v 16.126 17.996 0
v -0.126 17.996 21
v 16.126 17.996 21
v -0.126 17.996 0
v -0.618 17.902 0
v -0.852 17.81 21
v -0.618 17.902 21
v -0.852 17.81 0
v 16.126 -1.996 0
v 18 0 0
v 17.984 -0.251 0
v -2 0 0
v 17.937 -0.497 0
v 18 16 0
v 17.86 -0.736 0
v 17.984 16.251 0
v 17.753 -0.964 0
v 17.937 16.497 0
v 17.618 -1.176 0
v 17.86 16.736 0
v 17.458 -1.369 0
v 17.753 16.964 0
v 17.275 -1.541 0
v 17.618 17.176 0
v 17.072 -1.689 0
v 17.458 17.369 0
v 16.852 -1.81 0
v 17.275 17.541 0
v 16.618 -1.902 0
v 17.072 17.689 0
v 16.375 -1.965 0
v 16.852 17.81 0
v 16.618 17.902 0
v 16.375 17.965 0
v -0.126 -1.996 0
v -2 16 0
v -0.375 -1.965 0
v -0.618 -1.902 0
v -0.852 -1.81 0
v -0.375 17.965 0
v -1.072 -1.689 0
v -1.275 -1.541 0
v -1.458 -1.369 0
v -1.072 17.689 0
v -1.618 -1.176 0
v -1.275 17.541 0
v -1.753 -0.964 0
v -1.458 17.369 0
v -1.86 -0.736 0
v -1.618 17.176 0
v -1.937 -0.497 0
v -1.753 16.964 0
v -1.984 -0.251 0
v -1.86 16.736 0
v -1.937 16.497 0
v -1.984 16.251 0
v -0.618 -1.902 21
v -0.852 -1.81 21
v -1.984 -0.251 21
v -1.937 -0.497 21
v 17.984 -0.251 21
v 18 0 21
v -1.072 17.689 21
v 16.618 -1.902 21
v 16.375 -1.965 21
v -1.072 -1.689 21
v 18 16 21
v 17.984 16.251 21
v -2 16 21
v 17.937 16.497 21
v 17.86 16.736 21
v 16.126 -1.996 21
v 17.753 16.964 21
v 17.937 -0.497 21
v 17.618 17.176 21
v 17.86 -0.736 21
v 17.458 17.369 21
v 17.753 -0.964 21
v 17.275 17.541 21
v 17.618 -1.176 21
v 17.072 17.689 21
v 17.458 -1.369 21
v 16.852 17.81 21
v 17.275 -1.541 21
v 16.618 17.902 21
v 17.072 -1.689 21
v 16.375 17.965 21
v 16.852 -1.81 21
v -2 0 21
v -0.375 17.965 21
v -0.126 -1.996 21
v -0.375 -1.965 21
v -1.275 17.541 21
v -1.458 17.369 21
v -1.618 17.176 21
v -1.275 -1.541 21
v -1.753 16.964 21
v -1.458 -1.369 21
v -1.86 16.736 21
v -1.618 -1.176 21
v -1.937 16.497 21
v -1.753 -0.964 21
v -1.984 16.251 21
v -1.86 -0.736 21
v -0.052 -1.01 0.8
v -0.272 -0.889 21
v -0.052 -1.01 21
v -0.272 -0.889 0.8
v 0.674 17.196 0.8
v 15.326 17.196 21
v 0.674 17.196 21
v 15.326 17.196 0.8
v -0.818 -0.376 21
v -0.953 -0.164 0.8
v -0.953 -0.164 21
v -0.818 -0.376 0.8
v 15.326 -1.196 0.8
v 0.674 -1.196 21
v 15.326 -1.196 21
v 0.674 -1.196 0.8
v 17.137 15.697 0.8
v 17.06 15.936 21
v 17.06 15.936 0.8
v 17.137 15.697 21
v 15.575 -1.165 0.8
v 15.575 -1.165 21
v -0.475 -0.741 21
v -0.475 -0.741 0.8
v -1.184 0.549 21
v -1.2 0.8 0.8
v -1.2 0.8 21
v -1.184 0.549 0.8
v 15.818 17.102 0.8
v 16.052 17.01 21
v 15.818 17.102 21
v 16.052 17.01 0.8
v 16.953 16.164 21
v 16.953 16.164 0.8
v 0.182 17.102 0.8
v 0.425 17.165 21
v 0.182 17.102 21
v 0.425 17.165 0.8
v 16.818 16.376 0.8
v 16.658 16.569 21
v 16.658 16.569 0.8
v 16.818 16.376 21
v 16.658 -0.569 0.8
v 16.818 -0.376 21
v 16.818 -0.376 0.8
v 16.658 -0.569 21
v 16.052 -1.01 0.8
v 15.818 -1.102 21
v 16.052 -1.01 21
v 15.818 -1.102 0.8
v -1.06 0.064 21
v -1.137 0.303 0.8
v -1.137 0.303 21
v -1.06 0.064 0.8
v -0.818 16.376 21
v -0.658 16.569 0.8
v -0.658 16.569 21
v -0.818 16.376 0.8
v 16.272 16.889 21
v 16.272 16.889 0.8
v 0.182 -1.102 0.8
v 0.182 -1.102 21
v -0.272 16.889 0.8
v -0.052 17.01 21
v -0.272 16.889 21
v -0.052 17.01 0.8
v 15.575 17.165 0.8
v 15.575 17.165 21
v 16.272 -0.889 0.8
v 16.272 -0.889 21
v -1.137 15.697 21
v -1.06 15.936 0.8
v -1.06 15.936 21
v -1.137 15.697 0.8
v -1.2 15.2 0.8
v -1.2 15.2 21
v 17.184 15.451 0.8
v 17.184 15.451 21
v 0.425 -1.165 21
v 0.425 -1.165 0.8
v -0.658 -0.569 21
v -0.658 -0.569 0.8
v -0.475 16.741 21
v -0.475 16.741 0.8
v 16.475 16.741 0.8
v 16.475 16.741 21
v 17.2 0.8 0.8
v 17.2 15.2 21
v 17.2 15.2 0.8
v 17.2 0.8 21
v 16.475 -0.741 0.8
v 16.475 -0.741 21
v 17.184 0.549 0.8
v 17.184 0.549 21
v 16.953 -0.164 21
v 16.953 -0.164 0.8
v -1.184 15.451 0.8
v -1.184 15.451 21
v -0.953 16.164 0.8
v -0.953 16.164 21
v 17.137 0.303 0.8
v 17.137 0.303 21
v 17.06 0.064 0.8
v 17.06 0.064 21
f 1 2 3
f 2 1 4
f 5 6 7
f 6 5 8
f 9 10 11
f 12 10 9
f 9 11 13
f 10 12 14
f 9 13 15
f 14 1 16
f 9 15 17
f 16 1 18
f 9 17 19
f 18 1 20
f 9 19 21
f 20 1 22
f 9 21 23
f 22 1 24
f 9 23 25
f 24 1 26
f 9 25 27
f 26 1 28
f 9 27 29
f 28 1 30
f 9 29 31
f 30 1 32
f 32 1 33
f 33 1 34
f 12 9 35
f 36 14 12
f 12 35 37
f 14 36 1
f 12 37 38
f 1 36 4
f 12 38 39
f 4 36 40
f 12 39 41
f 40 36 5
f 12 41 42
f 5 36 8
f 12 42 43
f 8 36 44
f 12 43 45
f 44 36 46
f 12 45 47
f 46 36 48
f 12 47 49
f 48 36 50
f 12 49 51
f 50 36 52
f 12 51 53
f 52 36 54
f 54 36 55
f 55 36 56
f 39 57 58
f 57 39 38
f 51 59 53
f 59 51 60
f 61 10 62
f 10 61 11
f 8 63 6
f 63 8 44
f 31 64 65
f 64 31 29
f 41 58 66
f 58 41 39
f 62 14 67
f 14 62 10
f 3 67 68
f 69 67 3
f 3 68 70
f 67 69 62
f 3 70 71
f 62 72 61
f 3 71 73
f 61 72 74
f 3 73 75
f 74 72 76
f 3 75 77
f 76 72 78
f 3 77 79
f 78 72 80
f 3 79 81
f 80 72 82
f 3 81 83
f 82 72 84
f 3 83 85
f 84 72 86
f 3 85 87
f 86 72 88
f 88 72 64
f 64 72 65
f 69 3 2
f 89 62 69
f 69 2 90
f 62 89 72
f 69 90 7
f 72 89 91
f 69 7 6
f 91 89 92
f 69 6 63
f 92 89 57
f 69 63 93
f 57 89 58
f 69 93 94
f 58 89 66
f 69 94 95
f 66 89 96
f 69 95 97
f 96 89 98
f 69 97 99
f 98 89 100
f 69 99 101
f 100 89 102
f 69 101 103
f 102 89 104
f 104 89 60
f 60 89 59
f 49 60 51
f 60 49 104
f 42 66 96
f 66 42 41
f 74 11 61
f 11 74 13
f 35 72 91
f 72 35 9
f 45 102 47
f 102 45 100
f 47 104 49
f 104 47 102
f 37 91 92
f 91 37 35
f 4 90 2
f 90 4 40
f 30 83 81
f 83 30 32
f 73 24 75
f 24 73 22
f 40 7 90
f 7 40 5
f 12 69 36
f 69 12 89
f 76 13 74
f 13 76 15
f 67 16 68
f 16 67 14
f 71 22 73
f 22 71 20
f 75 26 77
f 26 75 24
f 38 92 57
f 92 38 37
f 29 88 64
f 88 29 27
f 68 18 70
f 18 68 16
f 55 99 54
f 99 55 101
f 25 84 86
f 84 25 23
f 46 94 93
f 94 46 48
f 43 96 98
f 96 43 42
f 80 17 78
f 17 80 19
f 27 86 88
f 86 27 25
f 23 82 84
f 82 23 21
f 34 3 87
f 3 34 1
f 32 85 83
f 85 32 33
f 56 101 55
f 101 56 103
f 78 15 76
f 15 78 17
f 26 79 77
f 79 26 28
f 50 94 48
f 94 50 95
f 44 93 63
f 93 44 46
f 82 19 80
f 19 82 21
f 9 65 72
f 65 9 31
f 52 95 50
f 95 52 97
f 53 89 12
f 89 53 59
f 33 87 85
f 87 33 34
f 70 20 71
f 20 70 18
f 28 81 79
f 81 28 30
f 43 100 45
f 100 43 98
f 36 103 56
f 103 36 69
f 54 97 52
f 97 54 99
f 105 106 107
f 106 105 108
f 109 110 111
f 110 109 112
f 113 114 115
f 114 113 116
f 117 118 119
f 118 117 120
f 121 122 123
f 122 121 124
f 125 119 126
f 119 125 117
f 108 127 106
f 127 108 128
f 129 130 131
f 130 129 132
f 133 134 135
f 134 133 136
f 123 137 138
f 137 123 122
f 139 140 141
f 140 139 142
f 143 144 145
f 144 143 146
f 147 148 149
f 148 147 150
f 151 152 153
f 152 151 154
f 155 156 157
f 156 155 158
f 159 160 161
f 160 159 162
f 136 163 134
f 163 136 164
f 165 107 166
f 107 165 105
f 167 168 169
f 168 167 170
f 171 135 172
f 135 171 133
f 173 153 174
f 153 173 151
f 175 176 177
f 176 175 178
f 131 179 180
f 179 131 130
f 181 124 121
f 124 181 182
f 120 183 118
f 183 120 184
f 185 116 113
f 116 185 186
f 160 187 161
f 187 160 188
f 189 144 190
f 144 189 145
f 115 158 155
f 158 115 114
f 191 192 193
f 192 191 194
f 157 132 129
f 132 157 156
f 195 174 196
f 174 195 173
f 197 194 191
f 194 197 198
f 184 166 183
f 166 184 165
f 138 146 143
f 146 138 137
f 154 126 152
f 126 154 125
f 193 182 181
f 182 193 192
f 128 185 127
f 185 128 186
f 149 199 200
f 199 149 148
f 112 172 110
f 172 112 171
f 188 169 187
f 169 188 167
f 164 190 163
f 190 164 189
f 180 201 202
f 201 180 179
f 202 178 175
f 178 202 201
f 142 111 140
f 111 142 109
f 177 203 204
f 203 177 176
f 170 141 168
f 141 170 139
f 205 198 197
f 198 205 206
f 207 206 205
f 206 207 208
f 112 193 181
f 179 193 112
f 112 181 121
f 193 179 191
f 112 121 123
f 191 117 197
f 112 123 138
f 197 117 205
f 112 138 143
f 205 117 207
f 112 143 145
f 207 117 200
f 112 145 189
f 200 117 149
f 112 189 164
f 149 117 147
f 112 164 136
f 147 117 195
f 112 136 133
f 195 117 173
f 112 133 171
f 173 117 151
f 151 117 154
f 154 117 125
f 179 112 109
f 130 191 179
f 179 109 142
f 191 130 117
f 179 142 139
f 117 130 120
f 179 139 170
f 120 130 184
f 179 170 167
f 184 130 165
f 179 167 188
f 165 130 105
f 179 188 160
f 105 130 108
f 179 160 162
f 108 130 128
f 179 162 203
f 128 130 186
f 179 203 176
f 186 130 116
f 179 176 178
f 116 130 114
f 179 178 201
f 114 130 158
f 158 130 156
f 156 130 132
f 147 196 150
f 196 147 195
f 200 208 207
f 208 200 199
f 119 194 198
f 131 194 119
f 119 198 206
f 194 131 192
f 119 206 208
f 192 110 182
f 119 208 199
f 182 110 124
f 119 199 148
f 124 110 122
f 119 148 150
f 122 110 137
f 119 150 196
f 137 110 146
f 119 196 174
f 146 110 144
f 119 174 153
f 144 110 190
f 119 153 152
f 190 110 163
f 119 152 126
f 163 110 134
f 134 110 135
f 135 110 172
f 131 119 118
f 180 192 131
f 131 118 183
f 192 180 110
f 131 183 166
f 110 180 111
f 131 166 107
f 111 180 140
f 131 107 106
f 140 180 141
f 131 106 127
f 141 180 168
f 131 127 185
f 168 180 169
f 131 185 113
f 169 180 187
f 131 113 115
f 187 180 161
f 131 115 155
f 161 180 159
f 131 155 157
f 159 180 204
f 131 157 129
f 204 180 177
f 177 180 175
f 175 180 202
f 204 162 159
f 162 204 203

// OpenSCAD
wanddicke=.8;
//Außenmaße
hoehe=20;
breite=20-2*2;
laenge=20-2*2;
$fn=50;

difference(){
    minkowski(){
        cube([breite,laenge,hoehe]);
        cylinder(r=2,h=1);
    }
    translate([wanddicke,wanddicke,wanddicke]){
        minkowski(){
            cube([breite-2*wanddicke,laenge-2*wanddicke,hoehe-wanddicke]);
            cylinder(r=2,h=1);
        }
    }
}
